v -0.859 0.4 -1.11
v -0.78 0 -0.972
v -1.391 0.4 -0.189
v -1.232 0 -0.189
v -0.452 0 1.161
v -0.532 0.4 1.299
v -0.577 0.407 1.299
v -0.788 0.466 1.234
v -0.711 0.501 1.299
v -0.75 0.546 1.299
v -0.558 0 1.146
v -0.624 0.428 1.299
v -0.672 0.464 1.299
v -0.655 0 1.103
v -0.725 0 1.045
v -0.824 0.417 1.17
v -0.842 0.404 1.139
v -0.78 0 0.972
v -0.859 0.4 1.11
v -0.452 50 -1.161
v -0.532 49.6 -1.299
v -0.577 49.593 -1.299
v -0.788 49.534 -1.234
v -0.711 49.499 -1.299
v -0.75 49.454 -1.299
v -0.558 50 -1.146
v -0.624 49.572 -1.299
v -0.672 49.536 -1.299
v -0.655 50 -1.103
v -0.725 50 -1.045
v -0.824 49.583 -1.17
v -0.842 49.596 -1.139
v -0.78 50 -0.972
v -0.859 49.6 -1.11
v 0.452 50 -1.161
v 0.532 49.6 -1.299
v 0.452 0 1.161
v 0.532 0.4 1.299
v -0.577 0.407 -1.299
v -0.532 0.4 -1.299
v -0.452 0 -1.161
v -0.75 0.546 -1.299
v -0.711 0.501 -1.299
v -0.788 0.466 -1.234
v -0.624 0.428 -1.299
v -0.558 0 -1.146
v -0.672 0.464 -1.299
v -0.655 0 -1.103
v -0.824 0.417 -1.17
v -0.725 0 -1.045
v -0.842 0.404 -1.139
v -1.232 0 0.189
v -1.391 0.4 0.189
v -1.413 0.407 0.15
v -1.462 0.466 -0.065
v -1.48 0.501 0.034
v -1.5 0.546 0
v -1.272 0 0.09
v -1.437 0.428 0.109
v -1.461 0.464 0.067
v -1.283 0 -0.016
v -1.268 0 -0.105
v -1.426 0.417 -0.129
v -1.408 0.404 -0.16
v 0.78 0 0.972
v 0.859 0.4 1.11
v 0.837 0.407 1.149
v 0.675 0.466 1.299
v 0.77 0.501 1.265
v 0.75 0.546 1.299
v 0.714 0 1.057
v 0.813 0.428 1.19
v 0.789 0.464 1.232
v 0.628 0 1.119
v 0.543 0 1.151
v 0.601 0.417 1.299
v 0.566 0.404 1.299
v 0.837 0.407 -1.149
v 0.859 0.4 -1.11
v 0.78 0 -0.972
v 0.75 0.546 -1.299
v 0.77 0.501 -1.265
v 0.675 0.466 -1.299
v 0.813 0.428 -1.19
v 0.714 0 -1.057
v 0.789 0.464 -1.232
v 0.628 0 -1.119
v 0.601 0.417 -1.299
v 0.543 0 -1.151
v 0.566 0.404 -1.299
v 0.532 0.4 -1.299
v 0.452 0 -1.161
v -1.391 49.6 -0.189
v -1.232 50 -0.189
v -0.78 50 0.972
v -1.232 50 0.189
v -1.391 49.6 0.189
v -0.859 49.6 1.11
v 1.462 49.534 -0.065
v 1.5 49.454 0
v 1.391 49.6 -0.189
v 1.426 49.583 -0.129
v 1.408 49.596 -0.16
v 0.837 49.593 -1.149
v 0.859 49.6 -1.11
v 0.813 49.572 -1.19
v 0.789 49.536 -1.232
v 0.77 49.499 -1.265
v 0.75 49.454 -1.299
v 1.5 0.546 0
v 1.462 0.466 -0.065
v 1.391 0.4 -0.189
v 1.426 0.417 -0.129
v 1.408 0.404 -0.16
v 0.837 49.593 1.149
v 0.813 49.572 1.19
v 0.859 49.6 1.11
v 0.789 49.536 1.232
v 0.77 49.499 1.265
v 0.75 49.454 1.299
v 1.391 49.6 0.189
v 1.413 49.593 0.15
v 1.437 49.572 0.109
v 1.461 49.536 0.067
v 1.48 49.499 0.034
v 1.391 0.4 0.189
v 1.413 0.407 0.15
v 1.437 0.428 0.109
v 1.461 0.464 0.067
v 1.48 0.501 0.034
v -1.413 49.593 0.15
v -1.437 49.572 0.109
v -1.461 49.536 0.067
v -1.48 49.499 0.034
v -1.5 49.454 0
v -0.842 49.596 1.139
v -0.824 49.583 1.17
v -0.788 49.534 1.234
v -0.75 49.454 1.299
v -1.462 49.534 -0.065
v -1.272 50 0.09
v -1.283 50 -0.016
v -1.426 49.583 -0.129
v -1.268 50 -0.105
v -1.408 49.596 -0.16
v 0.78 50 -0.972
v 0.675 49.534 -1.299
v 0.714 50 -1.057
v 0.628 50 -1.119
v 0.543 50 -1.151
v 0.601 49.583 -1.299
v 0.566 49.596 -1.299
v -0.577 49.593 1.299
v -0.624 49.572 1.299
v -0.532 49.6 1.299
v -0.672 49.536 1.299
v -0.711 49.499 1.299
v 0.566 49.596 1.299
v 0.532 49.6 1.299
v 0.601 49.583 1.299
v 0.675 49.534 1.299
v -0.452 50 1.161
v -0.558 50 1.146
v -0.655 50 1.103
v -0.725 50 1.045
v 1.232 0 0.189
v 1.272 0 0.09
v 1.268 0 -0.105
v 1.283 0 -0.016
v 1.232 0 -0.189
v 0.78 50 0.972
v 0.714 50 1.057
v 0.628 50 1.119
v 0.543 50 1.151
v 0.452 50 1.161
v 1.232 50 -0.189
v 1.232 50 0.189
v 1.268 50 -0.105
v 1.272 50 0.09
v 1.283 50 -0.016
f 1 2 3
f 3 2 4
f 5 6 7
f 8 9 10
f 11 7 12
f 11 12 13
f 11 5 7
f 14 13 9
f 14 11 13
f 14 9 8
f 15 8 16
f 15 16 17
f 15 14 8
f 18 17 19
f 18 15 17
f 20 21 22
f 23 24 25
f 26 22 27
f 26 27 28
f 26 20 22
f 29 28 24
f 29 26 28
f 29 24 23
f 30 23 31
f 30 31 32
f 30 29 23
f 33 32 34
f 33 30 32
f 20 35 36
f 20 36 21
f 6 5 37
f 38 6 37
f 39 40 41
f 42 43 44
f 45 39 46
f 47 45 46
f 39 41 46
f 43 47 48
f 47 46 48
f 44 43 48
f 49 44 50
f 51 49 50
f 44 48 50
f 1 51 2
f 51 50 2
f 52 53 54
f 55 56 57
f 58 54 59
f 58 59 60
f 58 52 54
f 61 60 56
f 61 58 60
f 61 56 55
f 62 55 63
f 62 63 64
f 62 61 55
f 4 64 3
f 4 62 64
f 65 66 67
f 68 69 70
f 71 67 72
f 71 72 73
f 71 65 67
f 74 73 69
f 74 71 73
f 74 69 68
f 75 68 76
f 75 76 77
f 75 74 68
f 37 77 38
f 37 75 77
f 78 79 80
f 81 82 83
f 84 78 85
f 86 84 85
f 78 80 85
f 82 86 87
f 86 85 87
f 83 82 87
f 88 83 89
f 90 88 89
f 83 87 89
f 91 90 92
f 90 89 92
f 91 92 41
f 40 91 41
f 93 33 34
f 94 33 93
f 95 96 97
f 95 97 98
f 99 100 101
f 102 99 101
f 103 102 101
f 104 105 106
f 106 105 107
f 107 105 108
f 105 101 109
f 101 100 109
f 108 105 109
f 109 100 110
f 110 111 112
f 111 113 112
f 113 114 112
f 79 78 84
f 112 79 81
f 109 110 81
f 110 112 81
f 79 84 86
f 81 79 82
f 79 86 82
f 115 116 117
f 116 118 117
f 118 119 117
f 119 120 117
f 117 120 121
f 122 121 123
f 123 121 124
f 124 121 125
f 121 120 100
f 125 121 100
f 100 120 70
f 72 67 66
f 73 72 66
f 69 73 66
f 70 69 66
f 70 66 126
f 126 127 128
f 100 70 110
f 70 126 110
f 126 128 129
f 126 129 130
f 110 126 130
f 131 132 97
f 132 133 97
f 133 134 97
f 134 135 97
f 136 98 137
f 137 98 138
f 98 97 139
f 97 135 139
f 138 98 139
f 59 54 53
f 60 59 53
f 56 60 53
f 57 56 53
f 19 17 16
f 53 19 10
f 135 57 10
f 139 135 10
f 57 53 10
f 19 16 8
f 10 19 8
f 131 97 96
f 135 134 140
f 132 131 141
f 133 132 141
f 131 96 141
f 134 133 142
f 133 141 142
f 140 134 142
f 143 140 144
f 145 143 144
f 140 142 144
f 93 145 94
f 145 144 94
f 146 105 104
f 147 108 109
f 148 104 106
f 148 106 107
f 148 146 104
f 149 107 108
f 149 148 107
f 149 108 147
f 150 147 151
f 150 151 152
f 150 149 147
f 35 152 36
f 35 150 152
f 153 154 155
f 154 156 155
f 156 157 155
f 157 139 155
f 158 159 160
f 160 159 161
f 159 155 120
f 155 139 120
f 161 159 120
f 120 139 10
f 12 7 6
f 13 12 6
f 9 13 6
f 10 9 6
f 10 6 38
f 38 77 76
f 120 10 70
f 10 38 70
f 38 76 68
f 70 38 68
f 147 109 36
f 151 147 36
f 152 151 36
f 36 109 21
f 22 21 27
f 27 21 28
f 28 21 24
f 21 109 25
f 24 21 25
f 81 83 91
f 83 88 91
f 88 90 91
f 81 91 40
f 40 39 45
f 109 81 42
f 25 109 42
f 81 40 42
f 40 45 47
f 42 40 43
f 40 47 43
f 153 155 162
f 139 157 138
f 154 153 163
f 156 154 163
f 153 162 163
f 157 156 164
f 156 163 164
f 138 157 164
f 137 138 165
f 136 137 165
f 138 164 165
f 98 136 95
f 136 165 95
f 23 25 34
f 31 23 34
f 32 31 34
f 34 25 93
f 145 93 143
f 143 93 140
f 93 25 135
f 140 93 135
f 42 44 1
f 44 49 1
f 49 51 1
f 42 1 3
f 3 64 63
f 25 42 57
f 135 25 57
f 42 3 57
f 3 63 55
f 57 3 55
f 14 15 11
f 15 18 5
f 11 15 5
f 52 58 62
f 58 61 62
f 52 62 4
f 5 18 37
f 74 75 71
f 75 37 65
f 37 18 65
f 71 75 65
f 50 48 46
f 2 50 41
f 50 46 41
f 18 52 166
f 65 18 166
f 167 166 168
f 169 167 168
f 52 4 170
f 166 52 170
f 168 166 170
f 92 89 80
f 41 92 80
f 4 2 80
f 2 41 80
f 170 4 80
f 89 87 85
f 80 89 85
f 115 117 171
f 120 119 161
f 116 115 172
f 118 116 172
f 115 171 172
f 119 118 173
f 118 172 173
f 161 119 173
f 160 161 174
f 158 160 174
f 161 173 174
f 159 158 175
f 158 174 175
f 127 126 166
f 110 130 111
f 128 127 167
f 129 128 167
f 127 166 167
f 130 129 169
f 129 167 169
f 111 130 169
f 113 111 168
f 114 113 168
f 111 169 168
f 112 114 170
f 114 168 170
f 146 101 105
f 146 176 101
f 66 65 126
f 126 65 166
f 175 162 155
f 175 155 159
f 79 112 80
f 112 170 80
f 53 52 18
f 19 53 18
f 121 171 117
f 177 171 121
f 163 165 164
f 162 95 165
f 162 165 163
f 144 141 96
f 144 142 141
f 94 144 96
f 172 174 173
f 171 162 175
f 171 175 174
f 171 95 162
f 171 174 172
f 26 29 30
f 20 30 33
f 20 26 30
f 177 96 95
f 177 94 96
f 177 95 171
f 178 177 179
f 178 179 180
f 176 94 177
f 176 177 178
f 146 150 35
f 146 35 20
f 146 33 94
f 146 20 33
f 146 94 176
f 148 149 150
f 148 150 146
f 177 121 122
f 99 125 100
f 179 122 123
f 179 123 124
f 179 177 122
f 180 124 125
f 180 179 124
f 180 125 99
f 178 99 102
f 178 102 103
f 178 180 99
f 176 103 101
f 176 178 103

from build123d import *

# Parameters (mm, degrees)
BOSS_EXTRUDE1_DEPTH   = 50
CHAMFER1_SIZE         = 0.4
CHAMFER1_SIZE2        = 0.137731045
CHAMFER1_PART_2_SIZE  = 0.4
CHAMFER1_PART_2_SIZE2 = 0.137731045
CHAMFER1_PART_3_SIZE  = 0.4
CHAMFER1_PART_3_SIZE2 = 0.137731045
CHAMFER1_PART_4_SIZE  = 0.4
CHAMFER1_PART_4_SIZE2 = 0.137731045
CHAMFER1_PART_5_SIZE  = 0.4
CHAMFER1_PART_5_SIZE2 = 0.137731045
CHAMFER1_PART_6_SIZE  = 0.4
CHAMFER1_PART_6_SIZE2 = 0.137731045
FILLET1_R             = 0.4


with BuildPart() as part:
    # Sketch1 → Boss-Extrude1 (new body)
    with BuildSketch(Plane(origin=(0, 0, 0), x_dir=(1, 0, 0), z_dir=(0, 1, 0))):
        Polygon((1.5, 0), (0.75, 1.299038106), (-0.75, 1.299038106), (-1.5, 0), (-0.75, -1.299038106), (0.75, -1.299038106), align=None)
    extrude(amount=BOSS_EXTRUDE1_DEPTH)

    # Chamfer1
    chamfer1_edges = [part.edges().sort_by_distance(p)[0] for p in [
        (0, 50, -1.299038106),
        (0, 0, -1.299038106),
    ]]
    chamfer1_side = [part.faces().sort_by_distance(p)[0] for p in [
        (0, 25, -1.299038106),
    ]]
    chamfer(chamfer1_edges, length=CHAMFER1_SIZE, length2=CHAMFER1_SIZE2, reference=chamfer1_side[0])

    # Chamfer1 part 2
    chamfer1_part_2_edges = [part.edges().sort_by_distance(p)[0] for p in [
        (-1.125, 50, -0.649519053),
        (-1.125, 0, -0.649519053),
    ]]
    chamfer1_part_2_side = [part.faces().sort_by_distance(p)[0] for p in [
        (-1.125, 25, -0.649519053),
    ]]
    chamfer(chamfer1_part_2_edges, length=CHAMFER1_PART_2_SIZE, length2=CHAMFER1_PART_2_SIZE2, reference=chamfer1_part_2_side[0])

    # Chamfer1 part 3
    chamfer1_part_3_edges = [part.edges().sort_by_distance(p)[0] for p in [
        (-1.125, 50, 0.649519053),
        (-1.125, 0, 0.649519053),
    ]]
    chamfer1_part_3_side = [part.faces().sort_by_distance(p)[0] for p in [
        (-1.125, 25, 0.649519053),
    ]]
    chamfer(chamfer1_part_3_edges, length=CHAMFER1_PART_3_SIZE, length2=CHAMFER1_PART_3_SIZE2, reference=chamfer1_part_3_side[0])

    # Chamfer1 part 4
    chamfer1_part_4_edges = [part.edges().sort_by_distance(p)[0] for p in [
        (0, 50, 1.299038106),
        (0, 0, 1.299038106),
    ]]
    chamfer1_part_4_side = [part.faces().sort_by_distance(p)[0] for p in [
        (0, 25, 1.299038106),
    ]]
    chamfer(chamfer1_part_4_edges, length=CHAMFER1_PART_4_SIZE, length2=CHAMFER1_PART_4_SIZE2, reference=chamfer1_part_4_side[0])

    # Chamfer1 part 5
    chamfer1_part_5_edges = [part.edges().sort_by_distance(p)[0] for p in [
        (1.125, 50, 0.649519053),
        (1.125, 0, 0.649519053),
    ]]
    chamfer1_part_5_side = [part.faces().sort_by_distance(p)[0] for p in [
        (1.125, 25, 0.649519053),
    ]]
    chamfer(chamfer1_part_5_edges, length=CHAMFER1_PART_5_SIZE, length2=CHAMFER1_PART_5_SIZE2, reference=chamfer1_part_5_side[0])

    # Chamfer1 part 6
    chamfer1_part_6_edges = [part.edges().sort_by_distance(p)[0] for p in [
        (1.125, 50, -0.649519053),
        (1.125, 0, -0.649519053),
    ]]
    chamfer1_part_6_side = [part.faces().sort_by_distance(p)[0] for p in [
        (1.125, 25, -0.649519053),
    ]]
    chamfer(chamfer1_part_6_edges, length=CHAMFER1_PART_6_SIZE, length2=CHAMFER1_PART_6_SIZE2, reference=chamfer1_part_6_side[0])

    # Fillet1
    fillet1_edges = [part.edges().sort_by_distance(p)[0] for p in [
        (-0.710240472, 0.2, 1.230172583),
        (-1.420480944, 0.2, 0),
        (0.710240472, 0.2, 1.230172583),
        (-0.710240472, 0.2, -1.230172583),
        (1.420480944, 0.2, 0),
        (0.710240472, 0.2, -1.230172583),
        (-0.710240472, 49.8, -1.230172583),
        (0.710240472, 49.8, -1.230172583),
        (-1.420480944, 49.8, 0),
        (1.420480944, 49.8, 0),
        (-0.710240472, 49.8, 1.230172583),
        (0.710240472, 49.8, 1.230172583),
    ]]
    fillet(fillet1_edges, radius=FILLET1_R)


solid = part.part
